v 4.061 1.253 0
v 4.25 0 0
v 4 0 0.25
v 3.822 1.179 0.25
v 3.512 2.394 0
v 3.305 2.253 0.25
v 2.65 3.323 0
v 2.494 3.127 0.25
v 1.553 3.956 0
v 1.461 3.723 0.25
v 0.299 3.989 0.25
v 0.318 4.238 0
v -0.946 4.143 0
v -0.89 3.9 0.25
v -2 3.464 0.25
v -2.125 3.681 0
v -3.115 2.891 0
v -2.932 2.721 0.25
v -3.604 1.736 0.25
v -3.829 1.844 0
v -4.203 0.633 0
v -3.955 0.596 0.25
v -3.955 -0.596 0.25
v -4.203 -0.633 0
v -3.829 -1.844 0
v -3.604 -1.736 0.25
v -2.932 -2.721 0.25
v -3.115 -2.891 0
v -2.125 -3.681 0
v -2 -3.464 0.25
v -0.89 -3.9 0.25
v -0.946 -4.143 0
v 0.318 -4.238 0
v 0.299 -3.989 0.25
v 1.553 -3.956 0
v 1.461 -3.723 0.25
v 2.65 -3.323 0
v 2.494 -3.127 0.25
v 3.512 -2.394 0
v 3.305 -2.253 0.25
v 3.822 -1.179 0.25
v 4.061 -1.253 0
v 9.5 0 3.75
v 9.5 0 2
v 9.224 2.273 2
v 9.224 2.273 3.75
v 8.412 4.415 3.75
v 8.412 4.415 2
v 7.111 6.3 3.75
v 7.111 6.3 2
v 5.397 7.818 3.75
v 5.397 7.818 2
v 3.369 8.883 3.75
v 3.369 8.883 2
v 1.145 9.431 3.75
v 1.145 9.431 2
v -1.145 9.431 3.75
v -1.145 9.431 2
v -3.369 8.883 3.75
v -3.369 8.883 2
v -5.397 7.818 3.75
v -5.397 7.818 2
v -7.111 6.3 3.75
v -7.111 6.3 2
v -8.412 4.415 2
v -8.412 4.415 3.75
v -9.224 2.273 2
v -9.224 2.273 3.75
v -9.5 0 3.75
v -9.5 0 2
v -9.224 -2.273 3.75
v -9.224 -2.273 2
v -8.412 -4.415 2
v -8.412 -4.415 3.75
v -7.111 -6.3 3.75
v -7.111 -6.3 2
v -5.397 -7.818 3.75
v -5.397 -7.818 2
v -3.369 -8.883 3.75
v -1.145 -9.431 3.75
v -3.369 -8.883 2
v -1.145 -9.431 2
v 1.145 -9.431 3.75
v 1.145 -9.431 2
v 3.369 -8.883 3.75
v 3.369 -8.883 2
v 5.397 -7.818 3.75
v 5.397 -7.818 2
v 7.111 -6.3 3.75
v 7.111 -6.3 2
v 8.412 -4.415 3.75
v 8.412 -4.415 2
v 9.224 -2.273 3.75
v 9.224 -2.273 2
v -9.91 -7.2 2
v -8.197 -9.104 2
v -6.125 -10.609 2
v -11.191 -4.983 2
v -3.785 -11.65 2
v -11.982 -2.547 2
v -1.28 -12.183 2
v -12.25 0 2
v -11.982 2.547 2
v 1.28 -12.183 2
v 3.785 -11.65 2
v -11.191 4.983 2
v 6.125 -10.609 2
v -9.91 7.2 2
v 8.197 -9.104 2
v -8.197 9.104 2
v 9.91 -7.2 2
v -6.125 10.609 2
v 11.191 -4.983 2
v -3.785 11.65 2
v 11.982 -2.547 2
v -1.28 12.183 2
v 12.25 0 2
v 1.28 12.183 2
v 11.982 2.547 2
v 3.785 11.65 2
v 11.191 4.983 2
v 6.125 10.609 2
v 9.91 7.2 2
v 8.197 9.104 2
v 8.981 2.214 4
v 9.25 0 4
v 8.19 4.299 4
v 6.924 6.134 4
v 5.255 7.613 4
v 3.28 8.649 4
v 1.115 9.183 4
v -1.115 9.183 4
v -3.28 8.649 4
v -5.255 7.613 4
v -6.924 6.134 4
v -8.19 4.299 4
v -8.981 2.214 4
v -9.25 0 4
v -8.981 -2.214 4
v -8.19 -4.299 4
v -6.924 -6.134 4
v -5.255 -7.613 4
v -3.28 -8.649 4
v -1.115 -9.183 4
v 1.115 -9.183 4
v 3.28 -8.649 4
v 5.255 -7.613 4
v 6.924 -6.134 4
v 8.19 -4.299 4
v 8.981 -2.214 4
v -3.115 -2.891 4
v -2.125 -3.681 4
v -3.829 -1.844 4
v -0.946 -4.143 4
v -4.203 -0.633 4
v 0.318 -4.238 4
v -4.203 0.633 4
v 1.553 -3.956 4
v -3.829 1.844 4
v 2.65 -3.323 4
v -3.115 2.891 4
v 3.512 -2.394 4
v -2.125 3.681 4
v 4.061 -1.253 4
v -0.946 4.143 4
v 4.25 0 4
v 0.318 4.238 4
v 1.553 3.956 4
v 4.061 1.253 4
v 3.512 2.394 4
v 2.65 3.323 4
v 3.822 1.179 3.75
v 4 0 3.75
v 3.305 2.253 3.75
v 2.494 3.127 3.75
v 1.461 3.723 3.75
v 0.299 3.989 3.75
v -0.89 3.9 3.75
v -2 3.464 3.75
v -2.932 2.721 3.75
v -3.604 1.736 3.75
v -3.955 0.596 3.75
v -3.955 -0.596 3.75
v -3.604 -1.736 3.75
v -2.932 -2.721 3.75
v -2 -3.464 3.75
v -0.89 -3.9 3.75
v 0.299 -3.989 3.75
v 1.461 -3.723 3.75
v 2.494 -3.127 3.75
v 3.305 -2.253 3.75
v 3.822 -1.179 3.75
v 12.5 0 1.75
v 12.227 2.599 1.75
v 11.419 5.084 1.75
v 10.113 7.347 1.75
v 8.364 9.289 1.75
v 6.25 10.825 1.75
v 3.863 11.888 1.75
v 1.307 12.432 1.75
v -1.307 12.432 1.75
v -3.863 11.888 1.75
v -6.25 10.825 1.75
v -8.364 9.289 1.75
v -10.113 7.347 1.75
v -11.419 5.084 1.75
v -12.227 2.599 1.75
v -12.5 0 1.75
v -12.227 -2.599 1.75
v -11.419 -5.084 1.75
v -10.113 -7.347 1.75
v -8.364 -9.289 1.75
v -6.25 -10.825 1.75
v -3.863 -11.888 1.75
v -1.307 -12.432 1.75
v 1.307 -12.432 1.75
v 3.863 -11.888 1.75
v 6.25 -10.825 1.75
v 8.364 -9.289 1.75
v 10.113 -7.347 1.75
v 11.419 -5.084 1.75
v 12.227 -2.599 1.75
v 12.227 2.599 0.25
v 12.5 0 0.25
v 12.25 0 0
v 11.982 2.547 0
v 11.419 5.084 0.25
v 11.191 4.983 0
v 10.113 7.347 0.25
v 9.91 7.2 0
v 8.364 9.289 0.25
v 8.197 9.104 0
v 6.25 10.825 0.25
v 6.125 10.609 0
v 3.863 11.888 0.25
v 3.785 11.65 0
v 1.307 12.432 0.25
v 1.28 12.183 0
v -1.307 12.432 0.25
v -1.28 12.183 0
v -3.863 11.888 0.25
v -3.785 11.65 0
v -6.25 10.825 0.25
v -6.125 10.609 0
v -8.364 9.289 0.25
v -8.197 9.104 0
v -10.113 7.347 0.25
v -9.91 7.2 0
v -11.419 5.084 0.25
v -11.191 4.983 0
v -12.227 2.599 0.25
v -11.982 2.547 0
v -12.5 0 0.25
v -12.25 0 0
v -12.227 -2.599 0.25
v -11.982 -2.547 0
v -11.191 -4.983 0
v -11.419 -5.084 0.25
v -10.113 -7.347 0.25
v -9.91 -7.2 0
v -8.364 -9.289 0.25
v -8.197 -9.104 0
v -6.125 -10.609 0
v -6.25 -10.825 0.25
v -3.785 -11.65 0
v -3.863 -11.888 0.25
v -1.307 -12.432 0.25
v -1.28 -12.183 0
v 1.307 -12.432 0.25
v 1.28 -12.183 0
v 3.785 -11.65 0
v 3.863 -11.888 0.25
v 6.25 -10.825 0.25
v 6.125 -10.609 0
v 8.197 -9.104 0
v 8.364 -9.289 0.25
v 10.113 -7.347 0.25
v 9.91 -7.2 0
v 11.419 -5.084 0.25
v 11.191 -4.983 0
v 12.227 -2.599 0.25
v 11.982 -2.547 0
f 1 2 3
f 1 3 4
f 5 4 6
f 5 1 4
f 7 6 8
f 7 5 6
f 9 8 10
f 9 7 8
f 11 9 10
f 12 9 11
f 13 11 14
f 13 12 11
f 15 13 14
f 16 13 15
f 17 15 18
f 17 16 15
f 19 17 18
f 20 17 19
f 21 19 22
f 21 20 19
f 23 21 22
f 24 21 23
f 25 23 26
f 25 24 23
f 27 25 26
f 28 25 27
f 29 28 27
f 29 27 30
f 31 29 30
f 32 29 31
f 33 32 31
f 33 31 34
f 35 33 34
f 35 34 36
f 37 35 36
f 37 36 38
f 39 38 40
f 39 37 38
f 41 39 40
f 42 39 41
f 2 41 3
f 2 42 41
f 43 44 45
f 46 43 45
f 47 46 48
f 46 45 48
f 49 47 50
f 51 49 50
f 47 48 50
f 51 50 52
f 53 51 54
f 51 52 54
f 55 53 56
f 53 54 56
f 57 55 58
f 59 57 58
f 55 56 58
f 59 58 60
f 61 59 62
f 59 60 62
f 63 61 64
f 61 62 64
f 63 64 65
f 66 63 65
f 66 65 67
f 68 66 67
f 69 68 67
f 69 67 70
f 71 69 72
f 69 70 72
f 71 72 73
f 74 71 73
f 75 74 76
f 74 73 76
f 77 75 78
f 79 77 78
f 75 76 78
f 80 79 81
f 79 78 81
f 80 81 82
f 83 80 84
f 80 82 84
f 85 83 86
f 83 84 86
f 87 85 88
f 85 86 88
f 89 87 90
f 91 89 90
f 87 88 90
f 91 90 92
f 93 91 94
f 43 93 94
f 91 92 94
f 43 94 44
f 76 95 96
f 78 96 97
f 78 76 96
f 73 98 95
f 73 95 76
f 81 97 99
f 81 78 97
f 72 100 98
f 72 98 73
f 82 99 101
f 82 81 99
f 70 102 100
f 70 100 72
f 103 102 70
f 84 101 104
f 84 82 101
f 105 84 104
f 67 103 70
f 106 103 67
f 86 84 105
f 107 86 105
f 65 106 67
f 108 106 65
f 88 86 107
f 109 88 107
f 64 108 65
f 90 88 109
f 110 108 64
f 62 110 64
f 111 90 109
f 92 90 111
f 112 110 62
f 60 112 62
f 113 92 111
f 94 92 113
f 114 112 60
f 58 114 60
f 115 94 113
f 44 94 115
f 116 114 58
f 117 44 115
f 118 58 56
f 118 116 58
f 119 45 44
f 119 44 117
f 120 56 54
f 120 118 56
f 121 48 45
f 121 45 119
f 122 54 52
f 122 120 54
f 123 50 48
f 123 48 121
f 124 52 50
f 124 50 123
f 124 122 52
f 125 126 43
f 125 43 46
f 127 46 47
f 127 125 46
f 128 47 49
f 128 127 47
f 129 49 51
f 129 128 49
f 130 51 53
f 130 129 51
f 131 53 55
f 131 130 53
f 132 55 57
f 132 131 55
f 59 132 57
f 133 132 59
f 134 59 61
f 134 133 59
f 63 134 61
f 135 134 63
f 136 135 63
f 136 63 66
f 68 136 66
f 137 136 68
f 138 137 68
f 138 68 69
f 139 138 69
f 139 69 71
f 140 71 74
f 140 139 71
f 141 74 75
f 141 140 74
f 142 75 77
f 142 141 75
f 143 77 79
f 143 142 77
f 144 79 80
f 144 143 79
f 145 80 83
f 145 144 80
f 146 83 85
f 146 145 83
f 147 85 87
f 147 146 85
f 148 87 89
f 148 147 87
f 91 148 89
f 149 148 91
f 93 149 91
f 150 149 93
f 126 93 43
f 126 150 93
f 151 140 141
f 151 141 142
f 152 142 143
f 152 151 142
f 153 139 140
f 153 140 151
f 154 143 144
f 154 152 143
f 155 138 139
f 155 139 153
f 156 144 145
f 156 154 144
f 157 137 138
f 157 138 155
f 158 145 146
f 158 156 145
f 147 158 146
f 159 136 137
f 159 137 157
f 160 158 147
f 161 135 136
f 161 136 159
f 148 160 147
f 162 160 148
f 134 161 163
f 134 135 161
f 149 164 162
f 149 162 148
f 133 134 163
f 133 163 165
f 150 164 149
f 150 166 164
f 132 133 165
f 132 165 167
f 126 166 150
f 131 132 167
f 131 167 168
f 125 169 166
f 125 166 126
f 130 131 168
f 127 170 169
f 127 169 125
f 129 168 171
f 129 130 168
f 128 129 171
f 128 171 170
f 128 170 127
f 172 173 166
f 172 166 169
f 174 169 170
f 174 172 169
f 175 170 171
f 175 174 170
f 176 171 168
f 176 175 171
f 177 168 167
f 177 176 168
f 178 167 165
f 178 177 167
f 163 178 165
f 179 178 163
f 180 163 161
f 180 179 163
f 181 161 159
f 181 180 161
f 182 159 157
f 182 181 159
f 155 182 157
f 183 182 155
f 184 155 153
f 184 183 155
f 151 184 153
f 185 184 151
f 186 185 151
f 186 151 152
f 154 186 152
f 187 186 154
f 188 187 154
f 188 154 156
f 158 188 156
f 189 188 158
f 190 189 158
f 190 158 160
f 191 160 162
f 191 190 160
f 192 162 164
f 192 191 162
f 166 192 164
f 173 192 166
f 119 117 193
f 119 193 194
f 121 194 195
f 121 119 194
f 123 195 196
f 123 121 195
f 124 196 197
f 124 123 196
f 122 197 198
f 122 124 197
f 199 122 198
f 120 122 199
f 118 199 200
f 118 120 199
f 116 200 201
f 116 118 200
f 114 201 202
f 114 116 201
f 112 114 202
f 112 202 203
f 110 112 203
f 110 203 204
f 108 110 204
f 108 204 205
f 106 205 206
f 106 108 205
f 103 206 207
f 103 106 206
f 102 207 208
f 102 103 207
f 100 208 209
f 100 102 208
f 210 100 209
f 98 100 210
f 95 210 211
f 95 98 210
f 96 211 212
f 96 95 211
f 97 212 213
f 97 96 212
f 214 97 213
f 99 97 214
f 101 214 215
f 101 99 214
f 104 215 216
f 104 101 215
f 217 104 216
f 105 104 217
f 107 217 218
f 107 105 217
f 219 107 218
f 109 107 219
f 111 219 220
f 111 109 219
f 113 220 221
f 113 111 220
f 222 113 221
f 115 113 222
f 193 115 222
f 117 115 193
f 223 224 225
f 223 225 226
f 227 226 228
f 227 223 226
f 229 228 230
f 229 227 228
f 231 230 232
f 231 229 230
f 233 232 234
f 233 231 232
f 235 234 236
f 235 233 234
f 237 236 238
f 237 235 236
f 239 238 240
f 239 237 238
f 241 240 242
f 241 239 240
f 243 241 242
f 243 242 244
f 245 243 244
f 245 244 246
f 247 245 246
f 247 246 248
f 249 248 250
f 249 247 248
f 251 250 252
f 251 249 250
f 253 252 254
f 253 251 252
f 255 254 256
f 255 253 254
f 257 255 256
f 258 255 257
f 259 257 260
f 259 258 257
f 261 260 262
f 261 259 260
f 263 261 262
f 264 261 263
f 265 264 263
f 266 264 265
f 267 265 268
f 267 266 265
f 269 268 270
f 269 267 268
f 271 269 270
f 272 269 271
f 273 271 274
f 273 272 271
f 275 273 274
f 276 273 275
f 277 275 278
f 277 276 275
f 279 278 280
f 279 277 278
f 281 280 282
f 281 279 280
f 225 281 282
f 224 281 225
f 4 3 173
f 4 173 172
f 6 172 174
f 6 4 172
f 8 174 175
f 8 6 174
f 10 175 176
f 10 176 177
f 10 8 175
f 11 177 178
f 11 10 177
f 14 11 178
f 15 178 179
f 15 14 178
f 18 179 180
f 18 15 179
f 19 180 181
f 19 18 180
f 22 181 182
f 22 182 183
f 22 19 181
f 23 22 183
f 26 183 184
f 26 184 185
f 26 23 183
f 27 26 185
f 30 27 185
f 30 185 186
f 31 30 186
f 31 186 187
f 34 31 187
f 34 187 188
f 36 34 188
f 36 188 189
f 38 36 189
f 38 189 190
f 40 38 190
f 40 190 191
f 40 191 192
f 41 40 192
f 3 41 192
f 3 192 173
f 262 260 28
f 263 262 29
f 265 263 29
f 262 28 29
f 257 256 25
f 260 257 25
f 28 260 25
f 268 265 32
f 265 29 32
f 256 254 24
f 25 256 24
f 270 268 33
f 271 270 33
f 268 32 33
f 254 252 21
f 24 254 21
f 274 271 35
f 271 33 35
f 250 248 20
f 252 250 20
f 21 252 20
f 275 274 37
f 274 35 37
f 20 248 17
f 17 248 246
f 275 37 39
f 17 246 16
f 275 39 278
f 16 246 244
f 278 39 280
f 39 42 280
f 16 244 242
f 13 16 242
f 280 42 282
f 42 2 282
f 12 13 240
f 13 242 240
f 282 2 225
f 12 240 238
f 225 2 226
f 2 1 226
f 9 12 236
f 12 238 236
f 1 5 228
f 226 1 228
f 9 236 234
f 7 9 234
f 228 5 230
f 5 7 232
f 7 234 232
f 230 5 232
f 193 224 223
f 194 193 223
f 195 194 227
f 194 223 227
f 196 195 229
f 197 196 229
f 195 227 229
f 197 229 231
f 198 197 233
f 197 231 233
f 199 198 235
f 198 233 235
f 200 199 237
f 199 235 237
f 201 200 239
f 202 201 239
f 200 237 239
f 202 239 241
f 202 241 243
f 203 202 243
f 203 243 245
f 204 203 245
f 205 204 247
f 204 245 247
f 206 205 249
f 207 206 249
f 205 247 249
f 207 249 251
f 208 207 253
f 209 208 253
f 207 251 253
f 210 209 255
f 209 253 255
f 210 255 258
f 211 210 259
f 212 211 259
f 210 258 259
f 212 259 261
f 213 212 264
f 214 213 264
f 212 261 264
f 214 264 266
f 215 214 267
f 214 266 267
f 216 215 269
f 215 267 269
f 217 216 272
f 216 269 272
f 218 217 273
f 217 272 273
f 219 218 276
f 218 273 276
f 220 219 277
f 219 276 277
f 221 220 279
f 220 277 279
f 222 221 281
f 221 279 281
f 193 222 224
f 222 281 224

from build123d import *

# Parameters (mm, degrees)
F0_R     = 12.5
F0_R_2   = 4
F1_DEPTH = 2
F2_R     = 9.5
F2_R_2   = 4
F3_DEPTH = 2
F4_SIZE  = 0.25


with BuildPart() as f1:
    # F0 (on Top) → F1 (new body)
    with BuildSketch(Plane.XY):
        Circle(F0_R)
        Circle(F0_R_2, mode=Mode.SUBTRACT)
    extrude(amount=F1_DEPTH)

    # F2 (on face) → F3 (join)
    with BuildSketch(Plane.XY.offset(2)):
        Circle(F2_R)
        Circle(F2_R_2, mode=Mode.SUBTRACT)
    extrude(amount=F3_DEPTH)

    # F4
    f4_edges = [f1.edges().sort_by_distance(p)[0] for p in [
        (-9.5, 0, 4),
        (-4, 0, 4),
        (-12.5, 0, 2),
        (-12.5, 0, 0),
        (-4, 0, 0),
    ]]
    chamfer(f4_edges, length=F4_SIZE)


solid = f1.part
